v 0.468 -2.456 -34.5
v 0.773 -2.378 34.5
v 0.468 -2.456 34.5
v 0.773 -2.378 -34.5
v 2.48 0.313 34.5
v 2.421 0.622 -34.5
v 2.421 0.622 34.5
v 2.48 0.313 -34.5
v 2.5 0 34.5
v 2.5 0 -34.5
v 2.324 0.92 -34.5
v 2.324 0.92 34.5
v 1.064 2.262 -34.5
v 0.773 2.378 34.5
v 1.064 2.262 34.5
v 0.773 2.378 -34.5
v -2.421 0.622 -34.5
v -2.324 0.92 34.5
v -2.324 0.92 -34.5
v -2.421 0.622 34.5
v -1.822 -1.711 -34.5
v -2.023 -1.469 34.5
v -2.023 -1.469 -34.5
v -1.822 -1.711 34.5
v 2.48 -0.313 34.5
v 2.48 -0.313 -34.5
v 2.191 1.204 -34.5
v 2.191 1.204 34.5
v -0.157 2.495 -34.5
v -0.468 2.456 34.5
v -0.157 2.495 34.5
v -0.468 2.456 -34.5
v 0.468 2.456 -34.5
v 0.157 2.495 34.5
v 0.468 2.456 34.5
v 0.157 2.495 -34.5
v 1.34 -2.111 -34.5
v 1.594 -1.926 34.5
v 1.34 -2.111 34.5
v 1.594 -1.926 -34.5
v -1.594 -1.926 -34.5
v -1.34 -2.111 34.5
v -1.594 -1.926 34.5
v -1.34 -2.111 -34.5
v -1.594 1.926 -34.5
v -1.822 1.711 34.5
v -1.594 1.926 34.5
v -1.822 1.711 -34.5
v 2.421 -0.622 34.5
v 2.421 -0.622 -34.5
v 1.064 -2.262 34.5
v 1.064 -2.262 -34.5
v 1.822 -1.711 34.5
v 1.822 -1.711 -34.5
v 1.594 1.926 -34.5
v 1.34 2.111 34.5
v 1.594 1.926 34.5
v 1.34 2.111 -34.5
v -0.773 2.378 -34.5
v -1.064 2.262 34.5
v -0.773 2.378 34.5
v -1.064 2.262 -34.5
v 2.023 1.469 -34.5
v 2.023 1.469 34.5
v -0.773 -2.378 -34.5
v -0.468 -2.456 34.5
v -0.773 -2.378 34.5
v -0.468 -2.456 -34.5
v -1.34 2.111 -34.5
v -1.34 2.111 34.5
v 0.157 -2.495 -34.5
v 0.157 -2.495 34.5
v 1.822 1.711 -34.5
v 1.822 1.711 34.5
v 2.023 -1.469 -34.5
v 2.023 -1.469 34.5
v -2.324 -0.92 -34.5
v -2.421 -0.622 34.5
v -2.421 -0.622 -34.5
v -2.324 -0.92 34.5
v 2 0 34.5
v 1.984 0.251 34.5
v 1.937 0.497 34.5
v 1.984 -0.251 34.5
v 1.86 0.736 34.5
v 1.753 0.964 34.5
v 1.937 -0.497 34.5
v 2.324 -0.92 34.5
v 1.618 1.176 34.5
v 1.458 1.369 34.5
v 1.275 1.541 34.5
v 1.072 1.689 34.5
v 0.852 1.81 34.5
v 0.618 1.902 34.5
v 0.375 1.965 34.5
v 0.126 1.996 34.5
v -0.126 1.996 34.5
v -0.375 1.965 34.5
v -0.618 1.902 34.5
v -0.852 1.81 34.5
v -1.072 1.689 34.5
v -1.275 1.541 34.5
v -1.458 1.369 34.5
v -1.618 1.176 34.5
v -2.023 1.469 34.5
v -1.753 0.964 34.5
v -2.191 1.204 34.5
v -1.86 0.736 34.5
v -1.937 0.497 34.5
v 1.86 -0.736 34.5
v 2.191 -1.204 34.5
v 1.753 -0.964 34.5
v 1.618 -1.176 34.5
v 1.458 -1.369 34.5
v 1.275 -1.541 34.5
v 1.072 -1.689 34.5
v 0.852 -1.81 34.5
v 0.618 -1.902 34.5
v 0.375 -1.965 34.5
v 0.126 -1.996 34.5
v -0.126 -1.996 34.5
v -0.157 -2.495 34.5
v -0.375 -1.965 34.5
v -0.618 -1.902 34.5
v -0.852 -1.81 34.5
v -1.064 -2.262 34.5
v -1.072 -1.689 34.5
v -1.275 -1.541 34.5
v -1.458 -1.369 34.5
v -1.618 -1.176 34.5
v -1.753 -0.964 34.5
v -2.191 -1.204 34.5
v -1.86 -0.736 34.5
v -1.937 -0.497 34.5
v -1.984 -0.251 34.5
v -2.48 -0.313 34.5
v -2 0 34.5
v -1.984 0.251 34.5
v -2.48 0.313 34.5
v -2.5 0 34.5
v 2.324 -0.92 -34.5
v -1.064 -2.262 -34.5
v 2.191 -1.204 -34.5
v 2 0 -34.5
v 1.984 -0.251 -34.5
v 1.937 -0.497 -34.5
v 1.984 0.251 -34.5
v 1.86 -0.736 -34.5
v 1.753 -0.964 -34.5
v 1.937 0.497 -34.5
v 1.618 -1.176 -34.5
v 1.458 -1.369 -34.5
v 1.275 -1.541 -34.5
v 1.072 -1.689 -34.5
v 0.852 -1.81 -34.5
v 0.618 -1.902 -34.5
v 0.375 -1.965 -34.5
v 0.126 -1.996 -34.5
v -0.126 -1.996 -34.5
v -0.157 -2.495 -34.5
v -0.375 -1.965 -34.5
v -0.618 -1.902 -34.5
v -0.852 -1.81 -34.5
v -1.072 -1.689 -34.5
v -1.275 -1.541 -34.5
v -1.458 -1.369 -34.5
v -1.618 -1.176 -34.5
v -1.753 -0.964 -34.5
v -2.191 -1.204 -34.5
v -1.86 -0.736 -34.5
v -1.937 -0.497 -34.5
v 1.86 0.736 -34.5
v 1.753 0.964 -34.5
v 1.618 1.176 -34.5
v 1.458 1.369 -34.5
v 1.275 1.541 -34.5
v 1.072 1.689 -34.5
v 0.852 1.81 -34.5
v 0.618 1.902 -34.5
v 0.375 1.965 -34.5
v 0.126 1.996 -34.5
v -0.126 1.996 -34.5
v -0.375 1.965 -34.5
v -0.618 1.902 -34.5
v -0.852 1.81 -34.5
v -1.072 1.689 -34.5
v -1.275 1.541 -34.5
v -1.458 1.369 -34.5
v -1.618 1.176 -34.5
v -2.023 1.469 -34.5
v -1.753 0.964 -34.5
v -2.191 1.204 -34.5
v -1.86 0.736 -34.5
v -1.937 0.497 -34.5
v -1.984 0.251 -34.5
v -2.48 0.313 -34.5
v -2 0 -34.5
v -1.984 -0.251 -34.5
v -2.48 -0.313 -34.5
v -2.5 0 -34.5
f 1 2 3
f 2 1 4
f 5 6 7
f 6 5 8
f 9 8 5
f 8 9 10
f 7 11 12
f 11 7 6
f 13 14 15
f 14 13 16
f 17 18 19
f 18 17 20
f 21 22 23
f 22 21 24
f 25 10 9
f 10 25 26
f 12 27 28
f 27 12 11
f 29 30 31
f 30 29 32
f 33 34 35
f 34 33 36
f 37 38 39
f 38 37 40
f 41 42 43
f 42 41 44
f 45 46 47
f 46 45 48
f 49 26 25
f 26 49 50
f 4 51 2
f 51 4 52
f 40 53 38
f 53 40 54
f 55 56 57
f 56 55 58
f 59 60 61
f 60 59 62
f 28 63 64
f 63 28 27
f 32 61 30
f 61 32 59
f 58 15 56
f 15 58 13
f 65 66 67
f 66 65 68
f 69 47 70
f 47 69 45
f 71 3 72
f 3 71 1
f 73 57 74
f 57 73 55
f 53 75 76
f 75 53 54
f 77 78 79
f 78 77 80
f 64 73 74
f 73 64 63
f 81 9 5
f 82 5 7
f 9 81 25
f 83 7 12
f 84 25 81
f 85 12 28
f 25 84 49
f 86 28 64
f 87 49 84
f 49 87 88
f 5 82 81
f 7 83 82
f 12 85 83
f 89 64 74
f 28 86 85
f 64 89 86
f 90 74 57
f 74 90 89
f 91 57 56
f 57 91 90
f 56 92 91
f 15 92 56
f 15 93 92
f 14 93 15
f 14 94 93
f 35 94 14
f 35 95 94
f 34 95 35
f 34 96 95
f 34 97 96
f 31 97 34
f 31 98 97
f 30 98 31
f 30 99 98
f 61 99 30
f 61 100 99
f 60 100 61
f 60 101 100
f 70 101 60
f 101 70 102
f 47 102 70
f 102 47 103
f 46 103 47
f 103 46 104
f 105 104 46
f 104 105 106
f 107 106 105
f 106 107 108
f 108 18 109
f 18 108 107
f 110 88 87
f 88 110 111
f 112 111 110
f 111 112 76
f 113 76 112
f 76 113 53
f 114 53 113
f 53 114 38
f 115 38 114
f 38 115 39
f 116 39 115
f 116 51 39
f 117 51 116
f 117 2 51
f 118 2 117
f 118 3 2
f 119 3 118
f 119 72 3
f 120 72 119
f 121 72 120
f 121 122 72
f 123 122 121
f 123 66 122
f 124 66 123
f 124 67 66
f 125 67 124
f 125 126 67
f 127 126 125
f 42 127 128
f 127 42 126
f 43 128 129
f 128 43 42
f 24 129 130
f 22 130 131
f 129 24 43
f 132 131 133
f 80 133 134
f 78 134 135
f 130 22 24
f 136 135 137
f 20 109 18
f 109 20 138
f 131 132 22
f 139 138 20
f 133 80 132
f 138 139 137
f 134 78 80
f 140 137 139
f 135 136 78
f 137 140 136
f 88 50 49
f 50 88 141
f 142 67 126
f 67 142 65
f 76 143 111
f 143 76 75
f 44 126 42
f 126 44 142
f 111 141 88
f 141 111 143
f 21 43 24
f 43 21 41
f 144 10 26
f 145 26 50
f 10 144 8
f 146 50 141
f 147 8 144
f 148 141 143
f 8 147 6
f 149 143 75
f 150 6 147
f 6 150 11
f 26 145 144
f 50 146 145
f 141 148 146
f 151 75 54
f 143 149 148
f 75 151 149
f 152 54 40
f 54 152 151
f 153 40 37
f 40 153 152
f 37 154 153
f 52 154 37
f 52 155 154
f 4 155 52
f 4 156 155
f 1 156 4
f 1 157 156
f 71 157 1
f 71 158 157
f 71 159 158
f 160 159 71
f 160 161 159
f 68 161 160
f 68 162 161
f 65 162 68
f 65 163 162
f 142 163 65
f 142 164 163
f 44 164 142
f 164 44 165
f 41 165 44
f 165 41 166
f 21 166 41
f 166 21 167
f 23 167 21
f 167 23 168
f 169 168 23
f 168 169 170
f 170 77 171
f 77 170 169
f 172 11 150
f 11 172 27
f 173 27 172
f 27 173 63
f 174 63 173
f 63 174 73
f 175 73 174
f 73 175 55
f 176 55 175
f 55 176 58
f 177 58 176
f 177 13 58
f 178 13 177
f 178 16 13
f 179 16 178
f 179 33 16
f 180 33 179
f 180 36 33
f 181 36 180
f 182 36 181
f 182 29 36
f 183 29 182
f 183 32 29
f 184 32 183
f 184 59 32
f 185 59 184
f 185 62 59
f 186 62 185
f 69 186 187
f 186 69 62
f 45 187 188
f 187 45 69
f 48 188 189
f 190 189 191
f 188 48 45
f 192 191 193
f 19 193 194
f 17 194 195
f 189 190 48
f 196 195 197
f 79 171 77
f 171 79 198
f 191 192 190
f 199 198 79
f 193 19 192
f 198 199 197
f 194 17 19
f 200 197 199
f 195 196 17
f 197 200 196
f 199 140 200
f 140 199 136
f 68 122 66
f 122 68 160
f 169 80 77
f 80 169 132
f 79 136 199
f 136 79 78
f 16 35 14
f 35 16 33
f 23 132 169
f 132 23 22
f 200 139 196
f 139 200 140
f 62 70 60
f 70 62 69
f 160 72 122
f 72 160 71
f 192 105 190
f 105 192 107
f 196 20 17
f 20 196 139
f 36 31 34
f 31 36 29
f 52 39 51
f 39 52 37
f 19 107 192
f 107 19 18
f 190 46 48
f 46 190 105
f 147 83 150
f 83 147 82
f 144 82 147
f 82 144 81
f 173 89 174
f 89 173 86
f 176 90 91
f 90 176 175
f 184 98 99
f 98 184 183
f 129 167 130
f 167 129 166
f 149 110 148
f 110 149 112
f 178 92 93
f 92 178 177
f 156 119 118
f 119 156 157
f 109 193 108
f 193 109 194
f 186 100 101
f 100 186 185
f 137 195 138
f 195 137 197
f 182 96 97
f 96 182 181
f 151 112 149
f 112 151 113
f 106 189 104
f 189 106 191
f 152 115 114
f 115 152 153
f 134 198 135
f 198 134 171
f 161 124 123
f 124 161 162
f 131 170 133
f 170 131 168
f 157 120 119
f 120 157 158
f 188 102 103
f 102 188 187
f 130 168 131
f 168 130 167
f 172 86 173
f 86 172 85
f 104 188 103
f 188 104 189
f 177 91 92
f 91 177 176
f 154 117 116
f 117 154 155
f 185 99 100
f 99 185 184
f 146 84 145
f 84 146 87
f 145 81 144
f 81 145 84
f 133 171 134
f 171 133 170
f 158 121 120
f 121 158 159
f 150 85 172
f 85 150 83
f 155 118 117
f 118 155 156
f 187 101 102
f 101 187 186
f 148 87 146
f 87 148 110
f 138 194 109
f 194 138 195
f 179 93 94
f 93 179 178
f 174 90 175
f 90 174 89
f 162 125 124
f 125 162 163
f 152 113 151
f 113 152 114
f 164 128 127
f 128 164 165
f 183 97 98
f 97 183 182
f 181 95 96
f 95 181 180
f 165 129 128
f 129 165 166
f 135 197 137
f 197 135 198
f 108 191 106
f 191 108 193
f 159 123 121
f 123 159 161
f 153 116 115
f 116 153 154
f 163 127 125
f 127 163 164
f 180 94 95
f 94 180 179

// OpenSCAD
$fn = 50;


difference() {
	union() {
		translate(v = [0, 0, -34.5000000000]) {
			cylinder(h = 69, r = 2.5000000000);
		}
	}
	union() {
		translate(v = [0, 0, -100.0000000000]) {
			cylinder(h = 200, r = 2.0000000000);
		}
	}
}
